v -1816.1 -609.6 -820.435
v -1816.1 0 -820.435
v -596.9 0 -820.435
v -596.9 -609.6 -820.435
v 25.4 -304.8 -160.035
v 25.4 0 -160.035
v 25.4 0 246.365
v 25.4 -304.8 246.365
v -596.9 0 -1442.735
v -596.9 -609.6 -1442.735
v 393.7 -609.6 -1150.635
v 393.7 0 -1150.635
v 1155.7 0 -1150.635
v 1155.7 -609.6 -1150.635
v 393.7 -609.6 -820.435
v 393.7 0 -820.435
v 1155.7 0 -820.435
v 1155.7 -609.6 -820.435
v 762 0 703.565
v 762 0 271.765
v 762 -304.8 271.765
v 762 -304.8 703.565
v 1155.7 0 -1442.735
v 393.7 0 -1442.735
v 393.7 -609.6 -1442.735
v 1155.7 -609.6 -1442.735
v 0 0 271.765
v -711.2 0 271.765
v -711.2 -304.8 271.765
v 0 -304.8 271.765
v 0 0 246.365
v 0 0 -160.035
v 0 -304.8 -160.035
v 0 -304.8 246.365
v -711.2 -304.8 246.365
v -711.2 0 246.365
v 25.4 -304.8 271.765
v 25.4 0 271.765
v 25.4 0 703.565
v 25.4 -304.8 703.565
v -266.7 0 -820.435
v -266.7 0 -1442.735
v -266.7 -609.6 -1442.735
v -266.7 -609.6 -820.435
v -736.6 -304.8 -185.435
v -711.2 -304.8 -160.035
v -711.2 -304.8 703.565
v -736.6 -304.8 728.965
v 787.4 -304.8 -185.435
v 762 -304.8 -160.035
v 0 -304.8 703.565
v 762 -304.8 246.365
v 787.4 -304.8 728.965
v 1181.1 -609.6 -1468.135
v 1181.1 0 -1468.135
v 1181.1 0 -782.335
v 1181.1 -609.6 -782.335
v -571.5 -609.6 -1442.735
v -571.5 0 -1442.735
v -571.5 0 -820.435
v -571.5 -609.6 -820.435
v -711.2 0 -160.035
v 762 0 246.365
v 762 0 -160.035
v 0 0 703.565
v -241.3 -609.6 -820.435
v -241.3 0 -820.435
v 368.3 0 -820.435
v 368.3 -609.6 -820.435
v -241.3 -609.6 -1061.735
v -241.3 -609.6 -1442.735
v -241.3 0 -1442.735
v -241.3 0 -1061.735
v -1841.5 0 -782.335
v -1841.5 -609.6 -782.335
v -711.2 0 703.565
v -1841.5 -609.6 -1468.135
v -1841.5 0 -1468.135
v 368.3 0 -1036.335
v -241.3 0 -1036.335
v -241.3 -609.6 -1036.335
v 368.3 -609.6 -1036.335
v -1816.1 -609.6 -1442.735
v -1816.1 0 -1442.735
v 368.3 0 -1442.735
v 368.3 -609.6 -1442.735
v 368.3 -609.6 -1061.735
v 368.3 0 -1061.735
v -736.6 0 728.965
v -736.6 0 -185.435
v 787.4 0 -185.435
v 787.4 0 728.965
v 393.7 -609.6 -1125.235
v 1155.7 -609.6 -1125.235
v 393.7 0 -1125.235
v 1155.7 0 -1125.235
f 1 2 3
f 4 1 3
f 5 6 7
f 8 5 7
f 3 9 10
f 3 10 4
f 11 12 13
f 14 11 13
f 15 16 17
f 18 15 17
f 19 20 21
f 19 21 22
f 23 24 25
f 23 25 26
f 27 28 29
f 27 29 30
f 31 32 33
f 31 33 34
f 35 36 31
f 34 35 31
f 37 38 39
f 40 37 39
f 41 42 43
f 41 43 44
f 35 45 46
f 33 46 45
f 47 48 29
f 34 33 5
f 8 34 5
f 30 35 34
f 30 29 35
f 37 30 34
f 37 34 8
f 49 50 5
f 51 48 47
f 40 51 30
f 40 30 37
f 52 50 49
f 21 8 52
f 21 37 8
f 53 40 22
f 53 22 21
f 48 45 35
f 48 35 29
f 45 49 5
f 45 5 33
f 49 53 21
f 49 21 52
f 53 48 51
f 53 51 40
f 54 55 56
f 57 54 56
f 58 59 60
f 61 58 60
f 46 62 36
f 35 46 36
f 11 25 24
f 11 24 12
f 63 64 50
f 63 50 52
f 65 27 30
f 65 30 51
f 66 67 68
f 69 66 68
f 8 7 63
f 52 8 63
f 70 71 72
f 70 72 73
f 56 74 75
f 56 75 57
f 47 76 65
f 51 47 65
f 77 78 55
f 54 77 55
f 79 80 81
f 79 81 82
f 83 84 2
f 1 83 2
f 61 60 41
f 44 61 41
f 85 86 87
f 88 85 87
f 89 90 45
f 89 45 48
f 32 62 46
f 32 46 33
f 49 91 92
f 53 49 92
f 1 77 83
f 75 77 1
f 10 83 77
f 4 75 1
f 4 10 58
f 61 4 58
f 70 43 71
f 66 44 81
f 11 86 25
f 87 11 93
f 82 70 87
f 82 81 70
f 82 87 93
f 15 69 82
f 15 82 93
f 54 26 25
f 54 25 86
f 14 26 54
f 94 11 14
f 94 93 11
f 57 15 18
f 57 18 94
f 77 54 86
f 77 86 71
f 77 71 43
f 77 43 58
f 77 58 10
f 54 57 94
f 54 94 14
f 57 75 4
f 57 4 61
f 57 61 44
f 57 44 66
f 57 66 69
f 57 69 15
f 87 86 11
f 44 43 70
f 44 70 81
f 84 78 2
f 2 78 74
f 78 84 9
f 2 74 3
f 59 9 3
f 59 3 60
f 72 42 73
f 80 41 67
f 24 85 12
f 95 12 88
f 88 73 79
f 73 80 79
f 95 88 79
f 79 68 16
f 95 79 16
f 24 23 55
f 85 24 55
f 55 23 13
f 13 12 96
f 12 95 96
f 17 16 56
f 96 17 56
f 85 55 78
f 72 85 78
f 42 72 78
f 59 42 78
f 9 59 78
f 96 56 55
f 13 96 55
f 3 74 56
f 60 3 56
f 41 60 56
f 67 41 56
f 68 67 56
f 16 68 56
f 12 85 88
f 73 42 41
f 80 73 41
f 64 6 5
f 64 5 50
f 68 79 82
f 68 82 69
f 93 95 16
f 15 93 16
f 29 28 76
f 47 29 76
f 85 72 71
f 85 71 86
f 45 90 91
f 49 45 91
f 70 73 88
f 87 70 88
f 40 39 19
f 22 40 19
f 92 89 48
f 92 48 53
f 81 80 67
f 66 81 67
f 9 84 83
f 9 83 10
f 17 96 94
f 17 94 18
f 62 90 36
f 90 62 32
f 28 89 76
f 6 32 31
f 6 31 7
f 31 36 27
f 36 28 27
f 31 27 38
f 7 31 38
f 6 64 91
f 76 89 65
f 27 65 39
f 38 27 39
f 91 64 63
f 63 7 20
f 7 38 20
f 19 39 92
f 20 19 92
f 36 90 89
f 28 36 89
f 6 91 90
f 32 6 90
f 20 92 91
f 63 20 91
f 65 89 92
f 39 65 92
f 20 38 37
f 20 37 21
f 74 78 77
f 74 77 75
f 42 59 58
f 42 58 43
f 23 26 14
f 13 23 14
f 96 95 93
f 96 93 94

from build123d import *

# Parameters (mm, degrees)
F0_W     = 1524
F0_H     = 914.4
F0_W_2   = 711.2
F0_H_2   = 406.4
F0_H_3   = 431.8
F0_W_3   = 736.6
F2_DEPTH = 304.8
F0_W_4   = 3022.6
F0_H_4   = 685.8
F0_W_5   = 1219.2
F0_H_5   = 622.3
F0_W_6   = 304.8
F0_W_7   = 609.6
F0_H_6   = 381
F0_W_8   = 762
F0_H_7   = 292.1
F0_H_8   = 215.9
F0_H_9   = 304.8
F3_DEPTH = 609.6


# Not quite as in the source:
# - the program builds the solid bodies; features that only make, move or delete a surface that nothing else refers to are left out


with BuildPart() as f2:
    # F0 (on Front) → F2 (new body)
    with BuildSketch(Plane.XZ):
        with Locations((25.4, 271.7650001948)):
            Rectangle(F0_W, F0_H)
        with Locations((-355.6, 43.1650001948)):
            Rectangle(F0_W_2, F0_H_2, mode=Mode.SUBTRACT)
        with Locations((-355.6, 487.6650001948)):
            Rectangle(F0_W_2, F0_H_3, mode=Mode.SUBTRACT)
        with Locations((393.7, 43.1650001948)):
            Rectangle(F0_W_3, F0_H_2, mode=Mode.SUBTRACT)
        with Locations((393.7, 487.6650001948)):
            Rectangle(F0_W_3, F0_H_3, mode=Mode.SUBTRACT)
    extrude(amount=F2_DEPTH)


with BuildPart() as f3:
    # F0 (on Front) → F3 (new body)
    with BuildSketch(Plane.XZ):
        with Locations((-330.2, -1125.2349998052)):
            Rectangle(F0_W_4, F0_H_4)
        with Locations((-1206.5, -1131.5849998052)):
            Rectangle(F0_W_5, F0_H_5, mode=Mode.SUBTRACT)
        with Locations((-419.1, -1131.5849998052)):
            Rectangle(F0_W_6, F0_H_5, mode=Mode.SUBTRACT)
        with Locations((63.5, -1252.2349998052)):
            Rectangle(F0_W_7, F0_H_6, mode=Mode.SUBTRACT)
        with Locations((774.7, -1296.6849998052)):
            Rectangle(F0_W_8, F0_H_7, mode=Mode.SUBTRACT)
        with Locations((63.5, -928.3849998052)):
            Rectangle(F0_W_7, F0_H_8, mode=Mode.SUBTRACT)
        with Locations((774.7, -972.8349998052)):
            Rectangle(F0_W_8, F0_H_9, mode=Mode.SUBTRACT)
    extrude(amount=F3_DEPTH)


solid = Compound([f2.part, f3.part])
